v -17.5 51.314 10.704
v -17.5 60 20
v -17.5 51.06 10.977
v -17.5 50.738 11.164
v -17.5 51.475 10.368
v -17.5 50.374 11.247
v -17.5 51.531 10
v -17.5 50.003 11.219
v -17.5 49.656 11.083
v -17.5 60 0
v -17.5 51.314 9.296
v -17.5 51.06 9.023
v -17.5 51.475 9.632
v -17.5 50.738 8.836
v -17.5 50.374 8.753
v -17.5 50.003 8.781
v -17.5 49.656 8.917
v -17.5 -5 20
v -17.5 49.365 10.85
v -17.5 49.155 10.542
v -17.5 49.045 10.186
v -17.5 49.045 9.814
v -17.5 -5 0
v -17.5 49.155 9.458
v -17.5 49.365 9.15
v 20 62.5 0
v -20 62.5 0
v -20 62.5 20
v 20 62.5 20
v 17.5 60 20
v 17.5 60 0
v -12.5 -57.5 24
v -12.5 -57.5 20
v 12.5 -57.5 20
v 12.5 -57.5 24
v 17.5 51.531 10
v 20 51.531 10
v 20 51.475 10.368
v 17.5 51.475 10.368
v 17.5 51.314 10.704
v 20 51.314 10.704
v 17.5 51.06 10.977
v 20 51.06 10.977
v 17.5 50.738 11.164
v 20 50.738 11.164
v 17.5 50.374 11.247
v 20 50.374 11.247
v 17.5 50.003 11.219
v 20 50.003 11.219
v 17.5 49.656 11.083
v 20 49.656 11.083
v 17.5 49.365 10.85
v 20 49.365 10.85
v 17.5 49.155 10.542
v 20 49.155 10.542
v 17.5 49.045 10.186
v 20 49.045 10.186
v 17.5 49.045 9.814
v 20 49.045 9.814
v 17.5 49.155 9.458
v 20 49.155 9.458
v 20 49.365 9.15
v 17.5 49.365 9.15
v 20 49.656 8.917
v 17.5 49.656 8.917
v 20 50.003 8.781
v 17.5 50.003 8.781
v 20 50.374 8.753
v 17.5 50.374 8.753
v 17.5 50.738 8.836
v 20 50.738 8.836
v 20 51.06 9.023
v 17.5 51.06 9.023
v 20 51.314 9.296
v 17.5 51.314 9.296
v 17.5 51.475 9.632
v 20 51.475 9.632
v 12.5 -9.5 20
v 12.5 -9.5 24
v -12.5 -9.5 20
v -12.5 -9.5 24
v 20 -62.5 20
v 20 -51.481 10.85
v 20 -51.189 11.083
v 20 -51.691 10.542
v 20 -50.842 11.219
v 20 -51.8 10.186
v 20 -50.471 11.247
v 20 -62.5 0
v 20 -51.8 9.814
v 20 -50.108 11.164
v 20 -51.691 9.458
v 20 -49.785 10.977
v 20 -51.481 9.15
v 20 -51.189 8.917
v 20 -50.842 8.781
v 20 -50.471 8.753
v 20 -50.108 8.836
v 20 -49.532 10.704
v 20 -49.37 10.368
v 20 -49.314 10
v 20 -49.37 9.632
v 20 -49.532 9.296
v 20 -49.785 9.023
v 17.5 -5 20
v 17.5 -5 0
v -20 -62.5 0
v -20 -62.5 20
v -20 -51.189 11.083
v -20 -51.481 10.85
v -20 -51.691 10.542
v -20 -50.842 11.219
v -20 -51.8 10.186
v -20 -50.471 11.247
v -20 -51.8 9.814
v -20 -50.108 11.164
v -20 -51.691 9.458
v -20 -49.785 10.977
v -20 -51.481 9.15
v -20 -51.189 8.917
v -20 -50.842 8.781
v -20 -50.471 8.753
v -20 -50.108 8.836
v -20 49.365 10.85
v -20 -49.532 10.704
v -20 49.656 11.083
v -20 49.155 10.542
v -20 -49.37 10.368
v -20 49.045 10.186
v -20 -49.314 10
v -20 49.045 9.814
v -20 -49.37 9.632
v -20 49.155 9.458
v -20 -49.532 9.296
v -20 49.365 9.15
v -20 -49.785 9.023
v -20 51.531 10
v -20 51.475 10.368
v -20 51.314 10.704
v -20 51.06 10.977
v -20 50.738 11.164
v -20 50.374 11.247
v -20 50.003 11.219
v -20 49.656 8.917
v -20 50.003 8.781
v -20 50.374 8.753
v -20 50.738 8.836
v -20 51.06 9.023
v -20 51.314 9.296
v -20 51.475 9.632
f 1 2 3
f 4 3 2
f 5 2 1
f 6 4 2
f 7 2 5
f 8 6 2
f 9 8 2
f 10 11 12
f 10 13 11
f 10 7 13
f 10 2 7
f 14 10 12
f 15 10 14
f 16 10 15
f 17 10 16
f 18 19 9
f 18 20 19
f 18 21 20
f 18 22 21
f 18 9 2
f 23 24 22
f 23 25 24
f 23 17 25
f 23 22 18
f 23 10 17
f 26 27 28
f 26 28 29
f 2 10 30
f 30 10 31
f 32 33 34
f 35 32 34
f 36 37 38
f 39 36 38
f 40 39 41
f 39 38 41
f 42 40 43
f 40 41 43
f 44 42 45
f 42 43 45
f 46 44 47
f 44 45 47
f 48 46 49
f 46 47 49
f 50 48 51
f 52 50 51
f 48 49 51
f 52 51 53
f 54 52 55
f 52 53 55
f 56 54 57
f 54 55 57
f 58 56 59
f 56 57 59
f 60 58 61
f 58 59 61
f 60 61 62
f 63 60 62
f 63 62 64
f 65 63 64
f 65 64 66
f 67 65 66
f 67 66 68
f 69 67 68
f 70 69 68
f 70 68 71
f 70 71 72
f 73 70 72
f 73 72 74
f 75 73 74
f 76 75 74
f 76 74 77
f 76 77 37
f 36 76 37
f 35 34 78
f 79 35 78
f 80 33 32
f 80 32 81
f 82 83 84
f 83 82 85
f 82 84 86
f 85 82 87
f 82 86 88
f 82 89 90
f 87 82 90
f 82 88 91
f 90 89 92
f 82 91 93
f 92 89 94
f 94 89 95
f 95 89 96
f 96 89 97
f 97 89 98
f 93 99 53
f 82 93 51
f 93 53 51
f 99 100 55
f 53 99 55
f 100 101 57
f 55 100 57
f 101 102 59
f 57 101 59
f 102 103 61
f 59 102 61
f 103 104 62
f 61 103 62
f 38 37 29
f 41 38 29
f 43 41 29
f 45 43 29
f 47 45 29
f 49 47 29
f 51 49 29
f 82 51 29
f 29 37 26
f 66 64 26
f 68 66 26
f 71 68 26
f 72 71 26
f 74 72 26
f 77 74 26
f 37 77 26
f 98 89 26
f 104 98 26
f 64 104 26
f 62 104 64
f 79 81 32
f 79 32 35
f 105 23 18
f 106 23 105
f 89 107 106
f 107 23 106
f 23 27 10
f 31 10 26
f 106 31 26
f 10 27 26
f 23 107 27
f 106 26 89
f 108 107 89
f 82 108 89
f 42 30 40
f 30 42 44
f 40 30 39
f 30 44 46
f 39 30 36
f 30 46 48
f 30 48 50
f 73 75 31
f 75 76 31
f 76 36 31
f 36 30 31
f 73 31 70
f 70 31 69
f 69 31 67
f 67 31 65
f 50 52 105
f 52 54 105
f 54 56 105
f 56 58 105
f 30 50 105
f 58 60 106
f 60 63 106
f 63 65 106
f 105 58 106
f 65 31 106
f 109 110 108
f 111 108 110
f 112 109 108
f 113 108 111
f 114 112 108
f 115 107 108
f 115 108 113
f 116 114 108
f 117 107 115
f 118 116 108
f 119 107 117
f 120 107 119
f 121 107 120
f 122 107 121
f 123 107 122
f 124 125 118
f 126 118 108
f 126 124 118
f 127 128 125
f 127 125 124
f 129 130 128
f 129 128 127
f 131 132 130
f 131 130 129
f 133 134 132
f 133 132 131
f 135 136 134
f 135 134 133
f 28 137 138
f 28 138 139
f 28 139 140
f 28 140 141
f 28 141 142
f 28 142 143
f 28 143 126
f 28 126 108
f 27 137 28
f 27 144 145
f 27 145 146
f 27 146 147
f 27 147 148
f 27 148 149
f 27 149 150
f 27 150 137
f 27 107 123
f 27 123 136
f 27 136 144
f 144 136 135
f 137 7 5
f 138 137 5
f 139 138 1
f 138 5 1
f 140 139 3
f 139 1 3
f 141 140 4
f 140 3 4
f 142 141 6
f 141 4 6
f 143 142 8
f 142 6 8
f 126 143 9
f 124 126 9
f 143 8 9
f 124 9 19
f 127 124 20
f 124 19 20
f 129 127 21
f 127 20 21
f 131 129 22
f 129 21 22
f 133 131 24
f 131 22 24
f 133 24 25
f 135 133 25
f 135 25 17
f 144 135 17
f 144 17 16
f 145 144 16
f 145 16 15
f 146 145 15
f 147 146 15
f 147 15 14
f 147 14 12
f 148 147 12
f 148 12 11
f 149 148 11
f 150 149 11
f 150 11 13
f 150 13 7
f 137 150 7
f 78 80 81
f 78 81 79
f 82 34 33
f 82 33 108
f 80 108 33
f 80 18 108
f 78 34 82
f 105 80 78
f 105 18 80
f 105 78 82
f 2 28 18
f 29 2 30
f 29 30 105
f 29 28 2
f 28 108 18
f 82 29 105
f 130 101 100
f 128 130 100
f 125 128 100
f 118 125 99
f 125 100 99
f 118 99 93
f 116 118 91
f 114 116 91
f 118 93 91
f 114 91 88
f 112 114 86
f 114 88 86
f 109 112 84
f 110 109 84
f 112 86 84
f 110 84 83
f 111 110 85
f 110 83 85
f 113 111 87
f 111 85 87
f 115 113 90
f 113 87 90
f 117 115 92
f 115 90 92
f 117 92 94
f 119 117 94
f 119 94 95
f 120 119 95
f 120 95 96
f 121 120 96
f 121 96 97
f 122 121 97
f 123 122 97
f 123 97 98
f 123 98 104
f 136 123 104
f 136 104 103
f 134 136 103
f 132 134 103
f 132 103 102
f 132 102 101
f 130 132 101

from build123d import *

# Parameters (mm, degrees)
F0_W     = 40
F0_H     = 125
F1_DEPTH = 20
F2_W     = 35
F2_H     = 65
F3_DEPTH = 42.6
F5_W     = 25
F5_H     = 48
F6_DEPTH = 4
F4_R     = 1.25
F7_DEPTH = 180
F8_R     = 1.25
F9_DEPTH = 71


with BuildPart() as f1:
    # F0 (on Top) → F1 (new body)
    with BuildSketch(Plane.XY):
        Rectangle(F0_W, F0_H)
    extrude(amount=F1_DEPTH)

    # F2 (on face) → F3 (cut)
    with BuildSketch(Plane(origin=(0, 0, 0), x_dir=(1, 0, 0), z_dir=(0, 0, -1))):
        with Locations((0, -27.5)):
            Rectangle(F2_W, F2_H)
    extrude(amount=-F3_DEPTH, mode=Mode.SUBTRACT)

    # F5 (on face) → F6 (join)
    with BuildSketch(Plane.XY.offset(20)):
        with Locations((0, -33.5)):
            Rectangle(F5_W, F5_H)
    extrude(amount=F6_DEPTH)

    # F4 (on face) → F7 (cut)
    with BuildSketch(Plane.YZ.offset(20)):
        with Locations((-50.5643, 10)):
            Circle(F4_R)
    extrude(amount=-F7_DEPTH, mode=Mode.SUBTRACT)

    # F8 (on face) → F9 (cut)
    with BuildSketch(Plane.YZ.offset(20)):
        with Locations((50.281025, 10)):
            Circle(F8_R)
    extrude(amount=-F9_DEPTH, mode=Mode.SUBTRACT)


solid = f1.part
